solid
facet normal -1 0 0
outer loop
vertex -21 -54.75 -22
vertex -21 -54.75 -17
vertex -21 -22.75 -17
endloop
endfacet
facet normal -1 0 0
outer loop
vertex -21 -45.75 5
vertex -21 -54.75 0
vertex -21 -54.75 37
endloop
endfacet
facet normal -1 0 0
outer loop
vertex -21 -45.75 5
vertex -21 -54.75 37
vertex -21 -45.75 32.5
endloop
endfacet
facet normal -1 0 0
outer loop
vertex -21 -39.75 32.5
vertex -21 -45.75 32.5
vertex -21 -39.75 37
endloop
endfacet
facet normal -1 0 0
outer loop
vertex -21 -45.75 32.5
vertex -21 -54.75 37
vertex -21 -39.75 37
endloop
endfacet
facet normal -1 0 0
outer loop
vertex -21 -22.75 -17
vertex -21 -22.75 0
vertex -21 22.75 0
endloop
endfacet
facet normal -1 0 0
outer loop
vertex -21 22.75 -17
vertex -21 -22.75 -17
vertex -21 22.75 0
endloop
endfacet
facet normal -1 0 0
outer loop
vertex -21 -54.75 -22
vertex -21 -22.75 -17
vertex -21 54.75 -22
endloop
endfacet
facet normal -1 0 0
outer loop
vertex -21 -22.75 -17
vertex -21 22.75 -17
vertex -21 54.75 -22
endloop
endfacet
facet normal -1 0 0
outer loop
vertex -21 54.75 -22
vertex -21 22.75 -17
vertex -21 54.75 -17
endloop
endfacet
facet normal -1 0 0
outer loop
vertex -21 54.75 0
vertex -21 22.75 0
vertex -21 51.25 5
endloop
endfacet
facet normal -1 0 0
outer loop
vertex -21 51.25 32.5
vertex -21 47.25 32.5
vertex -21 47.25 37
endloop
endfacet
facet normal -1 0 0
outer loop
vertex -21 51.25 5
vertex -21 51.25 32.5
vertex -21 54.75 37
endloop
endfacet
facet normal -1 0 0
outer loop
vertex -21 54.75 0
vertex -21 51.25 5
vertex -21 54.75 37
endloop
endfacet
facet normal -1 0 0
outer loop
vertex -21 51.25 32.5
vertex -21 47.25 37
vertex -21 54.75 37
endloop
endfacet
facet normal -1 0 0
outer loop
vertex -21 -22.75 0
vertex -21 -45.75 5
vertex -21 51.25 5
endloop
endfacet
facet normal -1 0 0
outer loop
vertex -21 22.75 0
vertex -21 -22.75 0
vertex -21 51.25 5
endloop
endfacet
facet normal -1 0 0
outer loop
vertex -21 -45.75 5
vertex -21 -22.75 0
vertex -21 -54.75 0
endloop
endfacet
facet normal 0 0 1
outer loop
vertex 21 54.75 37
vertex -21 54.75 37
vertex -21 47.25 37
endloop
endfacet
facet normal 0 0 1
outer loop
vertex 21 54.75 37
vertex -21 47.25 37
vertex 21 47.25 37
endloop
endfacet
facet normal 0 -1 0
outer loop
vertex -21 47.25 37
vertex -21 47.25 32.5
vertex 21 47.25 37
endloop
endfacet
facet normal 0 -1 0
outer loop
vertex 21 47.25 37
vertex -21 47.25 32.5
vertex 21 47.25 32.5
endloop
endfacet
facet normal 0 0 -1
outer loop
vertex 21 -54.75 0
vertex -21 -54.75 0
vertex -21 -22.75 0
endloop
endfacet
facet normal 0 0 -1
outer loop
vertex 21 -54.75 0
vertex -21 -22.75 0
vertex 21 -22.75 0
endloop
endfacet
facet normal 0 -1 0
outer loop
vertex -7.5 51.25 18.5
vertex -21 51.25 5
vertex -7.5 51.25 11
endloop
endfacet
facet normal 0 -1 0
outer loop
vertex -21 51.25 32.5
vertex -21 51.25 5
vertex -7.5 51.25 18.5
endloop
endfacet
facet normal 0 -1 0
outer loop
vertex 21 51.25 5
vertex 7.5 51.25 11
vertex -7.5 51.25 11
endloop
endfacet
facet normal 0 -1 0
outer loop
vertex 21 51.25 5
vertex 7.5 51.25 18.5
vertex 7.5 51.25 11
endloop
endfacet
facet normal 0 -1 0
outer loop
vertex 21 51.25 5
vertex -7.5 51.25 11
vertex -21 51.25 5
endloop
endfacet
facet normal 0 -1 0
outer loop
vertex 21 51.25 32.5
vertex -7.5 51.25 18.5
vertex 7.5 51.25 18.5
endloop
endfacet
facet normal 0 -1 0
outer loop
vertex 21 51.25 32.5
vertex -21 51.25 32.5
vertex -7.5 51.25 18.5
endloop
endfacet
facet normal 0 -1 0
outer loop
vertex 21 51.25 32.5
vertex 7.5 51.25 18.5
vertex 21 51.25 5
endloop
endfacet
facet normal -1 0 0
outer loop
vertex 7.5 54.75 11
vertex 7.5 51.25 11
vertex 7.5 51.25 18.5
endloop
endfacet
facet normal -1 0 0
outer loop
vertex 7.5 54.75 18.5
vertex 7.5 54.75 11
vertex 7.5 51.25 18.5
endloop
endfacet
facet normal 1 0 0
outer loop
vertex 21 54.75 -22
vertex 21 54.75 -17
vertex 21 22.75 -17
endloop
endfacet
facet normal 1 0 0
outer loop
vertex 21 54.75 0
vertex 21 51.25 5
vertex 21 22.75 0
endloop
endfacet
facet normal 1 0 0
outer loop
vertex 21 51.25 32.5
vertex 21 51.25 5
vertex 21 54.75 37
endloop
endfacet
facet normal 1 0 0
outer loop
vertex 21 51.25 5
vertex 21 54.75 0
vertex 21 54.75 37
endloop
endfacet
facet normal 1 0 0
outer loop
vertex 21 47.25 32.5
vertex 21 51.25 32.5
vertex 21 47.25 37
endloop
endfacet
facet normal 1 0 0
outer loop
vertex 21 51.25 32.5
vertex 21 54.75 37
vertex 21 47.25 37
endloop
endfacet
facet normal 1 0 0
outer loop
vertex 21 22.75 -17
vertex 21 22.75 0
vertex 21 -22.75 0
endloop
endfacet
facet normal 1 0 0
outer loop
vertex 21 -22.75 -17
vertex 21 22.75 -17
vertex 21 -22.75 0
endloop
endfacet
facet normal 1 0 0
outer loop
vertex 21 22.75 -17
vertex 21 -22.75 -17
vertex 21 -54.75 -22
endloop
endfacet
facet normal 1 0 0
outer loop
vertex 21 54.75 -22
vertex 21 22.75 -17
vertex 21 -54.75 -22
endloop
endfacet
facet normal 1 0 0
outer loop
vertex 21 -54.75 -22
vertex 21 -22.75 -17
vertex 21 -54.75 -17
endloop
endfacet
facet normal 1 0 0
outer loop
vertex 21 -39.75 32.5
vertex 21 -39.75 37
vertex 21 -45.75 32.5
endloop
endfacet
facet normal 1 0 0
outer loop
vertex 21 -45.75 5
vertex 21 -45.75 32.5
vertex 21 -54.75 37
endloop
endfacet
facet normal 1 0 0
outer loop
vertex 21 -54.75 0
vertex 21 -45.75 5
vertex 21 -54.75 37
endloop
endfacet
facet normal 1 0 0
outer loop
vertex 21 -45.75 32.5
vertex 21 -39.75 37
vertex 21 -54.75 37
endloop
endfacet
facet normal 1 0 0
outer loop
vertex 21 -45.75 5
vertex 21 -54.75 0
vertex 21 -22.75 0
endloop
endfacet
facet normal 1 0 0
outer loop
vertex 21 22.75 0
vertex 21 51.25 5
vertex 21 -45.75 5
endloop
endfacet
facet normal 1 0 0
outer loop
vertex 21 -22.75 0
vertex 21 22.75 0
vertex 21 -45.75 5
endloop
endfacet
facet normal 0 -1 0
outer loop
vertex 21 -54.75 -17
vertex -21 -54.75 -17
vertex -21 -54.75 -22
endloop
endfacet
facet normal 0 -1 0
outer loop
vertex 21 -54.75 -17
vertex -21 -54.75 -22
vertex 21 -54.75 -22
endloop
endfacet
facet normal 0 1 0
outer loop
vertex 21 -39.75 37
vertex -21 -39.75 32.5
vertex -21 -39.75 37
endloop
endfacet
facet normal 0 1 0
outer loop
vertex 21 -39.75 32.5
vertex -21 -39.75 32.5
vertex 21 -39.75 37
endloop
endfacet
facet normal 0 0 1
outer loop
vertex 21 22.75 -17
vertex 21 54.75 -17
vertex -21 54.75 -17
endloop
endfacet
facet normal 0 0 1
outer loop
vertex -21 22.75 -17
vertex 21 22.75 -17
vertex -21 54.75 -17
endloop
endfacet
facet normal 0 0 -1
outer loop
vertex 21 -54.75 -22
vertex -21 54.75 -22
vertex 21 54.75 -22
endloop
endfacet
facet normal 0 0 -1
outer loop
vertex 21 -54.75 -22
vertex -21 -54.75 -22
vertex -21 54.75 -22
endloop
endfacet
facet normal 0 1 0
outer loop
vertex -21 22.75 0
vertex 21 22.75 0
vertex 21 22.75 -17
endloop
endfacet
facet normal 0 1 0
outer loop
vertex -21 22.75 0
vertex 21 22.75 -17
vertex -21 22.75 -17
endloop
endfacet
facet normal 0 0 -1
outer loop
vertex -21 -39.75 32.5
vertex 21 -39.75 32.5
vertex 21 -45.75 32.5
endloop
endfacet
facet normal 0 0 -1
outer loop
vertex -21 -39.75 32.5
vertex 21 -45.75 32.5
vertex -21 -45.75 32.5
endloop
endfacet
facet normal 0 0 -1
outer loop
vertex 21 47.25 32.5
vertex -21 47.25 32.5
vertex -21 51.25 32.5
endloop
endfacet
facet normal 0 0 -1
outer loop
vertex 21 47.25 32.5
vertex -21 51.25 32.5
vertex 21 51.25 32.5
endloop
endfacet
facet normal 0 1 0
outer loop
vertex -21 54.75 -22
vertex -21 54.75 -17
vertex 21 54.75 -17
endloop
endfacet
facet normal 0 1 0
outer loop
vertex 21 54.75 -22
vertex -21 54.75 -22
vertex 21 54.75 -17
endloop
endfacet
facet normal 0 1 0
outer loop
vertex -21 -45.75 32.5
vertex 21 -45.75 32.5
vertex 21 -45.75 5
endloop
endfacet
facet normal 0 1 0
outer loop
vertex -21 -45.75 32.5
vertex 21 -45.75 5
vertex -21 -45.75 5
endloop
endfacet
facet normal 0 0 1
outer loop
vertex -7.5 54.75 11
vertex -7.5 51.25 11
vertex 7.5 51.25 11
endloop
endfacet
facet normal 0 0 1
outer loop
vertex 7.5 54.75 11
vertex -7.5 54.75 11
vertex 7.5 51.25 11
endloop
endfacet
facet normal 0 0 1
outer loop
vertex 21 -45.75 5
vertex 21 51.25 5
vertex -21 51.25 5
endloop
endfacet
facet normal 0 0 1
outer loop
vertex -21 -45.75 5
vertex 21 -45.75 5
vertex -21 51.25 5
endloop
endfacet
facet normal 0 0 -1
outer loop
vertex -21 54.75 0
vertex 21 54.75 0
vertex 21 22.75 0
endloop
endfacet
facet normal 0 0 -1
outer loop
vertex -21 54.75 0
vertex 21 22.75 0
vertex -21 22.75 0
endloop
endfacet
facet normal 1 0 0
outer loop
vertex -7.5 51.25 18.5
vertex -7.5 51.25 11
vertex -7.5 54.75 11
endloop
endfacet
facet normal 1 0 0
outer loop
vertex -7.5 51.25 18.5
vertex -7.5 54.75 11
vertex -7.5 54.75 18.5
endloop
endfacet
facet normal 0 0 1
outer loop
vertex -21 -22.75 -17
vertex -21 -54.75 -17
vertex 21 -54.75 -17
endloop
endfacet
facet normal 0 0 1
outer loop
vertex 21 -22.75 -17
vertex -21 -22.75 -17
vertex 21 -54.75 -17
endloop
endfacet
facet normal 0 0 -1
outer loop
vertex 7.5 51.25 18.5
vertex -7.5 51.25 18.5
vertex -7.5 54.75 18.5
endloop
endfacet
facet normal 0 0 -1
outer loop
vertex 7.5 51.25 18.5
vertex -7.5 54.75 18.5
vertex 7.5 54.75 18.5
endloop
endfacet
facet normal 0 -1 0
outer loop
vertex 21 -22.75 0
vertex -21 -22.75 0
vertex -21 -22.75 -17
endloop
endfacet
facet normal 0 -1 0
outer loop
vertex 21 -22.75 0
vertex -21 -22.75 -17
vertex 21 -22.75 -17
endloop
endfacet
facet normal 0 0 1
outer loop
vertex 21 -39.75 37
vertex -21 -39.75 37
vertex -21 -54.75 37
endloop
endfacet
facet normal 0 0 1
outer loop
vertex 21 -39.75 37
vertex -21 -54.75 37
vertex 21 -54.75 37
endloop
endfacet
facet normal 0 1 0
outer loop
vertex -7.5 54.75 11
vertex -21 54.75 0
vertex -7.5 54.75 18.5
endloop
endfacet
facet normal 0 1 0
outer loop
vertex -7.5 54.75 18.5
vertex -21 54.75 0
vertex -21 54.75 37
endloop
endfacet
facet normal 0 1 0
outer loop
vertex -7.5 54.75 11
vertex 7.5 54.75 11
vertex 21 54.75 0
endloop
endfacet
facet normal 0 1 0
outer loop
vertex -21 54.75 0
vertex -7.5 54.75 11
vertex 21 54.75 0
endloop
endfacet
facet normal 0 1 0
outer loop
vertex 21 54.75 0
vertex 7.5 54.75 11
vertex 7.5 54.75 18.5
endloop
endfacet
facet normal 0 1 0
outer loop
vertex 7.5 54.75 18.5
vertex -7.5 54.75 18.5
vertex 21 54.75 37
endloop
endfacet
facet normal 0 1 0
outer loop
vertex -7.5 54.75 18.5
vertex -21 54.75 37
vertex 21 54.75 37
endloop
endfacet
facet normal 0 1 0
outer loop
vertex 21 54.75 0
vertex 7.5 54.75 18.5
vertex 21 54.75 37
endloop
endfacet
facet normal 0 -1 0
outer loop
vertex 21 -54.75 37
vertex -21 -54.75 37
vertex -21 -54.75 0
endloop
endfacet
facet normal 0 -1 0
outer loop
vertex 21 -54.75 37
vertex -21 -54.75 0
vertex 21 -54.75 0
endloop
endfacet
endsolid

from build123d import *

# Parameters (mm, degrees)
F0_W      = 42
F0_H      = 109.5
F1_DEPTH  = 5
F2_W      = 42
F2_H      = 7.5
F2_H_2    = 15
F3_DEPTH  = 32
F4_W      = 42
F4_H      = 27.5
F5_DEPTH  = 4
F6_W      = 42
F6_H      = 27.5
F7_DEPTH  = 6
F8_W      = 15
F8_H      = 7.5
F9_DEPTH  = 3.501
F10_W     = 42
F10_H     = 54.75
F11_DEPTH = 22
F12_W     = 42
F12_H     = 17
F13_DEPTH = 32
F14_W     = 42
F14_H     = 17
F15_DEPTH = 32


# Not quite as in the source:
# - a feature names something its author has since deleted; it is built from what else it names


with BuildPart() as f1:
    # F0 (on Top) → F1 (new body)
    with BuildSketch(Plane.XY):
        Rectangle(F0_W, F0_H)
    extrude(amount=F1_DEPTH)

    # F2 (on face) → F3 (join)
    with BuildSketch(Plane.XY.offset(5)):
        with Locations((0, 51)):
            Rectangle(F2_W, F2_H)
        with Locations((0, -47.25)):
            Rectangle(F2_W, F2_H_2)
    extrude(amount=F3_DEPTH)

    # F4 (on face) → F5 (cut)
    with BuildSketch(Plane.XZ.offset(-47.25)):
        with Locations((0, 18.75)):
            Rectangle(F4_W, F4_H)
    extrude(amount=-F5_DEPTH, mode=Mode.SUBTRACT)

    # F6 (on face) → F7 (cut)
    with BuildSketch(Plane(origin=(0, -39.75, 0), x_dir=(-1, 0, 0), z_dir=(0, 1, 0))):
        with Locations((0, 18.75)):
            Rectangle(F6_W, F6_H)
    extrude(amount=-F7_DEPTH, mode=Mode.SUBTRACT)

    # F8 (on face) → F9 (cut, through all)
    with BuildSketch(Plane.XZ.offset(-51.25)):
        with Locations((0, 14.75)):
            Rectangle(F8_W, F8_H)
    extrude(amount=-F9_DEPTH, mode=Mode.SUBTRACT)

    # F10 (on face) → F11 (join)
    with BuildSketch(Plane(origin=(0, 0, 0), x_dir=(1, 0, 0), z_dir=(0, 0, -1))):
        with Locations((0, -27.375)):
            Rectangle(F10_W, F10_H)
        with Locations((0, 27.375)):
            Rectangle(F10_W, F10_H)
    extrude(amount=F11_DEPTH)

    # F12 (on face) → F13 (cut)
    with BuildSketch(Plane(origin=(0, 54.75, 0), x_dir=(-1, 0, 0), z_dir=(0, 1, 0))):
        with Locations((0, -8.5)):
            Rectangle(F12_W, F12_H)
    extrude(amount=-F13_DEPTH, mode=Mode.SUBTRACT)

    # F14 (on face) → F15 (cut)
    with BuildSketch(Plane.XZ.offset(54.75)):
        with Locations((0, -8.5)):
            Rectangle(F14_W, F14_H)
    extrude(amount=-F15_DEPTH, mode=Mode.SUBTRACT)


solid = f1.part
